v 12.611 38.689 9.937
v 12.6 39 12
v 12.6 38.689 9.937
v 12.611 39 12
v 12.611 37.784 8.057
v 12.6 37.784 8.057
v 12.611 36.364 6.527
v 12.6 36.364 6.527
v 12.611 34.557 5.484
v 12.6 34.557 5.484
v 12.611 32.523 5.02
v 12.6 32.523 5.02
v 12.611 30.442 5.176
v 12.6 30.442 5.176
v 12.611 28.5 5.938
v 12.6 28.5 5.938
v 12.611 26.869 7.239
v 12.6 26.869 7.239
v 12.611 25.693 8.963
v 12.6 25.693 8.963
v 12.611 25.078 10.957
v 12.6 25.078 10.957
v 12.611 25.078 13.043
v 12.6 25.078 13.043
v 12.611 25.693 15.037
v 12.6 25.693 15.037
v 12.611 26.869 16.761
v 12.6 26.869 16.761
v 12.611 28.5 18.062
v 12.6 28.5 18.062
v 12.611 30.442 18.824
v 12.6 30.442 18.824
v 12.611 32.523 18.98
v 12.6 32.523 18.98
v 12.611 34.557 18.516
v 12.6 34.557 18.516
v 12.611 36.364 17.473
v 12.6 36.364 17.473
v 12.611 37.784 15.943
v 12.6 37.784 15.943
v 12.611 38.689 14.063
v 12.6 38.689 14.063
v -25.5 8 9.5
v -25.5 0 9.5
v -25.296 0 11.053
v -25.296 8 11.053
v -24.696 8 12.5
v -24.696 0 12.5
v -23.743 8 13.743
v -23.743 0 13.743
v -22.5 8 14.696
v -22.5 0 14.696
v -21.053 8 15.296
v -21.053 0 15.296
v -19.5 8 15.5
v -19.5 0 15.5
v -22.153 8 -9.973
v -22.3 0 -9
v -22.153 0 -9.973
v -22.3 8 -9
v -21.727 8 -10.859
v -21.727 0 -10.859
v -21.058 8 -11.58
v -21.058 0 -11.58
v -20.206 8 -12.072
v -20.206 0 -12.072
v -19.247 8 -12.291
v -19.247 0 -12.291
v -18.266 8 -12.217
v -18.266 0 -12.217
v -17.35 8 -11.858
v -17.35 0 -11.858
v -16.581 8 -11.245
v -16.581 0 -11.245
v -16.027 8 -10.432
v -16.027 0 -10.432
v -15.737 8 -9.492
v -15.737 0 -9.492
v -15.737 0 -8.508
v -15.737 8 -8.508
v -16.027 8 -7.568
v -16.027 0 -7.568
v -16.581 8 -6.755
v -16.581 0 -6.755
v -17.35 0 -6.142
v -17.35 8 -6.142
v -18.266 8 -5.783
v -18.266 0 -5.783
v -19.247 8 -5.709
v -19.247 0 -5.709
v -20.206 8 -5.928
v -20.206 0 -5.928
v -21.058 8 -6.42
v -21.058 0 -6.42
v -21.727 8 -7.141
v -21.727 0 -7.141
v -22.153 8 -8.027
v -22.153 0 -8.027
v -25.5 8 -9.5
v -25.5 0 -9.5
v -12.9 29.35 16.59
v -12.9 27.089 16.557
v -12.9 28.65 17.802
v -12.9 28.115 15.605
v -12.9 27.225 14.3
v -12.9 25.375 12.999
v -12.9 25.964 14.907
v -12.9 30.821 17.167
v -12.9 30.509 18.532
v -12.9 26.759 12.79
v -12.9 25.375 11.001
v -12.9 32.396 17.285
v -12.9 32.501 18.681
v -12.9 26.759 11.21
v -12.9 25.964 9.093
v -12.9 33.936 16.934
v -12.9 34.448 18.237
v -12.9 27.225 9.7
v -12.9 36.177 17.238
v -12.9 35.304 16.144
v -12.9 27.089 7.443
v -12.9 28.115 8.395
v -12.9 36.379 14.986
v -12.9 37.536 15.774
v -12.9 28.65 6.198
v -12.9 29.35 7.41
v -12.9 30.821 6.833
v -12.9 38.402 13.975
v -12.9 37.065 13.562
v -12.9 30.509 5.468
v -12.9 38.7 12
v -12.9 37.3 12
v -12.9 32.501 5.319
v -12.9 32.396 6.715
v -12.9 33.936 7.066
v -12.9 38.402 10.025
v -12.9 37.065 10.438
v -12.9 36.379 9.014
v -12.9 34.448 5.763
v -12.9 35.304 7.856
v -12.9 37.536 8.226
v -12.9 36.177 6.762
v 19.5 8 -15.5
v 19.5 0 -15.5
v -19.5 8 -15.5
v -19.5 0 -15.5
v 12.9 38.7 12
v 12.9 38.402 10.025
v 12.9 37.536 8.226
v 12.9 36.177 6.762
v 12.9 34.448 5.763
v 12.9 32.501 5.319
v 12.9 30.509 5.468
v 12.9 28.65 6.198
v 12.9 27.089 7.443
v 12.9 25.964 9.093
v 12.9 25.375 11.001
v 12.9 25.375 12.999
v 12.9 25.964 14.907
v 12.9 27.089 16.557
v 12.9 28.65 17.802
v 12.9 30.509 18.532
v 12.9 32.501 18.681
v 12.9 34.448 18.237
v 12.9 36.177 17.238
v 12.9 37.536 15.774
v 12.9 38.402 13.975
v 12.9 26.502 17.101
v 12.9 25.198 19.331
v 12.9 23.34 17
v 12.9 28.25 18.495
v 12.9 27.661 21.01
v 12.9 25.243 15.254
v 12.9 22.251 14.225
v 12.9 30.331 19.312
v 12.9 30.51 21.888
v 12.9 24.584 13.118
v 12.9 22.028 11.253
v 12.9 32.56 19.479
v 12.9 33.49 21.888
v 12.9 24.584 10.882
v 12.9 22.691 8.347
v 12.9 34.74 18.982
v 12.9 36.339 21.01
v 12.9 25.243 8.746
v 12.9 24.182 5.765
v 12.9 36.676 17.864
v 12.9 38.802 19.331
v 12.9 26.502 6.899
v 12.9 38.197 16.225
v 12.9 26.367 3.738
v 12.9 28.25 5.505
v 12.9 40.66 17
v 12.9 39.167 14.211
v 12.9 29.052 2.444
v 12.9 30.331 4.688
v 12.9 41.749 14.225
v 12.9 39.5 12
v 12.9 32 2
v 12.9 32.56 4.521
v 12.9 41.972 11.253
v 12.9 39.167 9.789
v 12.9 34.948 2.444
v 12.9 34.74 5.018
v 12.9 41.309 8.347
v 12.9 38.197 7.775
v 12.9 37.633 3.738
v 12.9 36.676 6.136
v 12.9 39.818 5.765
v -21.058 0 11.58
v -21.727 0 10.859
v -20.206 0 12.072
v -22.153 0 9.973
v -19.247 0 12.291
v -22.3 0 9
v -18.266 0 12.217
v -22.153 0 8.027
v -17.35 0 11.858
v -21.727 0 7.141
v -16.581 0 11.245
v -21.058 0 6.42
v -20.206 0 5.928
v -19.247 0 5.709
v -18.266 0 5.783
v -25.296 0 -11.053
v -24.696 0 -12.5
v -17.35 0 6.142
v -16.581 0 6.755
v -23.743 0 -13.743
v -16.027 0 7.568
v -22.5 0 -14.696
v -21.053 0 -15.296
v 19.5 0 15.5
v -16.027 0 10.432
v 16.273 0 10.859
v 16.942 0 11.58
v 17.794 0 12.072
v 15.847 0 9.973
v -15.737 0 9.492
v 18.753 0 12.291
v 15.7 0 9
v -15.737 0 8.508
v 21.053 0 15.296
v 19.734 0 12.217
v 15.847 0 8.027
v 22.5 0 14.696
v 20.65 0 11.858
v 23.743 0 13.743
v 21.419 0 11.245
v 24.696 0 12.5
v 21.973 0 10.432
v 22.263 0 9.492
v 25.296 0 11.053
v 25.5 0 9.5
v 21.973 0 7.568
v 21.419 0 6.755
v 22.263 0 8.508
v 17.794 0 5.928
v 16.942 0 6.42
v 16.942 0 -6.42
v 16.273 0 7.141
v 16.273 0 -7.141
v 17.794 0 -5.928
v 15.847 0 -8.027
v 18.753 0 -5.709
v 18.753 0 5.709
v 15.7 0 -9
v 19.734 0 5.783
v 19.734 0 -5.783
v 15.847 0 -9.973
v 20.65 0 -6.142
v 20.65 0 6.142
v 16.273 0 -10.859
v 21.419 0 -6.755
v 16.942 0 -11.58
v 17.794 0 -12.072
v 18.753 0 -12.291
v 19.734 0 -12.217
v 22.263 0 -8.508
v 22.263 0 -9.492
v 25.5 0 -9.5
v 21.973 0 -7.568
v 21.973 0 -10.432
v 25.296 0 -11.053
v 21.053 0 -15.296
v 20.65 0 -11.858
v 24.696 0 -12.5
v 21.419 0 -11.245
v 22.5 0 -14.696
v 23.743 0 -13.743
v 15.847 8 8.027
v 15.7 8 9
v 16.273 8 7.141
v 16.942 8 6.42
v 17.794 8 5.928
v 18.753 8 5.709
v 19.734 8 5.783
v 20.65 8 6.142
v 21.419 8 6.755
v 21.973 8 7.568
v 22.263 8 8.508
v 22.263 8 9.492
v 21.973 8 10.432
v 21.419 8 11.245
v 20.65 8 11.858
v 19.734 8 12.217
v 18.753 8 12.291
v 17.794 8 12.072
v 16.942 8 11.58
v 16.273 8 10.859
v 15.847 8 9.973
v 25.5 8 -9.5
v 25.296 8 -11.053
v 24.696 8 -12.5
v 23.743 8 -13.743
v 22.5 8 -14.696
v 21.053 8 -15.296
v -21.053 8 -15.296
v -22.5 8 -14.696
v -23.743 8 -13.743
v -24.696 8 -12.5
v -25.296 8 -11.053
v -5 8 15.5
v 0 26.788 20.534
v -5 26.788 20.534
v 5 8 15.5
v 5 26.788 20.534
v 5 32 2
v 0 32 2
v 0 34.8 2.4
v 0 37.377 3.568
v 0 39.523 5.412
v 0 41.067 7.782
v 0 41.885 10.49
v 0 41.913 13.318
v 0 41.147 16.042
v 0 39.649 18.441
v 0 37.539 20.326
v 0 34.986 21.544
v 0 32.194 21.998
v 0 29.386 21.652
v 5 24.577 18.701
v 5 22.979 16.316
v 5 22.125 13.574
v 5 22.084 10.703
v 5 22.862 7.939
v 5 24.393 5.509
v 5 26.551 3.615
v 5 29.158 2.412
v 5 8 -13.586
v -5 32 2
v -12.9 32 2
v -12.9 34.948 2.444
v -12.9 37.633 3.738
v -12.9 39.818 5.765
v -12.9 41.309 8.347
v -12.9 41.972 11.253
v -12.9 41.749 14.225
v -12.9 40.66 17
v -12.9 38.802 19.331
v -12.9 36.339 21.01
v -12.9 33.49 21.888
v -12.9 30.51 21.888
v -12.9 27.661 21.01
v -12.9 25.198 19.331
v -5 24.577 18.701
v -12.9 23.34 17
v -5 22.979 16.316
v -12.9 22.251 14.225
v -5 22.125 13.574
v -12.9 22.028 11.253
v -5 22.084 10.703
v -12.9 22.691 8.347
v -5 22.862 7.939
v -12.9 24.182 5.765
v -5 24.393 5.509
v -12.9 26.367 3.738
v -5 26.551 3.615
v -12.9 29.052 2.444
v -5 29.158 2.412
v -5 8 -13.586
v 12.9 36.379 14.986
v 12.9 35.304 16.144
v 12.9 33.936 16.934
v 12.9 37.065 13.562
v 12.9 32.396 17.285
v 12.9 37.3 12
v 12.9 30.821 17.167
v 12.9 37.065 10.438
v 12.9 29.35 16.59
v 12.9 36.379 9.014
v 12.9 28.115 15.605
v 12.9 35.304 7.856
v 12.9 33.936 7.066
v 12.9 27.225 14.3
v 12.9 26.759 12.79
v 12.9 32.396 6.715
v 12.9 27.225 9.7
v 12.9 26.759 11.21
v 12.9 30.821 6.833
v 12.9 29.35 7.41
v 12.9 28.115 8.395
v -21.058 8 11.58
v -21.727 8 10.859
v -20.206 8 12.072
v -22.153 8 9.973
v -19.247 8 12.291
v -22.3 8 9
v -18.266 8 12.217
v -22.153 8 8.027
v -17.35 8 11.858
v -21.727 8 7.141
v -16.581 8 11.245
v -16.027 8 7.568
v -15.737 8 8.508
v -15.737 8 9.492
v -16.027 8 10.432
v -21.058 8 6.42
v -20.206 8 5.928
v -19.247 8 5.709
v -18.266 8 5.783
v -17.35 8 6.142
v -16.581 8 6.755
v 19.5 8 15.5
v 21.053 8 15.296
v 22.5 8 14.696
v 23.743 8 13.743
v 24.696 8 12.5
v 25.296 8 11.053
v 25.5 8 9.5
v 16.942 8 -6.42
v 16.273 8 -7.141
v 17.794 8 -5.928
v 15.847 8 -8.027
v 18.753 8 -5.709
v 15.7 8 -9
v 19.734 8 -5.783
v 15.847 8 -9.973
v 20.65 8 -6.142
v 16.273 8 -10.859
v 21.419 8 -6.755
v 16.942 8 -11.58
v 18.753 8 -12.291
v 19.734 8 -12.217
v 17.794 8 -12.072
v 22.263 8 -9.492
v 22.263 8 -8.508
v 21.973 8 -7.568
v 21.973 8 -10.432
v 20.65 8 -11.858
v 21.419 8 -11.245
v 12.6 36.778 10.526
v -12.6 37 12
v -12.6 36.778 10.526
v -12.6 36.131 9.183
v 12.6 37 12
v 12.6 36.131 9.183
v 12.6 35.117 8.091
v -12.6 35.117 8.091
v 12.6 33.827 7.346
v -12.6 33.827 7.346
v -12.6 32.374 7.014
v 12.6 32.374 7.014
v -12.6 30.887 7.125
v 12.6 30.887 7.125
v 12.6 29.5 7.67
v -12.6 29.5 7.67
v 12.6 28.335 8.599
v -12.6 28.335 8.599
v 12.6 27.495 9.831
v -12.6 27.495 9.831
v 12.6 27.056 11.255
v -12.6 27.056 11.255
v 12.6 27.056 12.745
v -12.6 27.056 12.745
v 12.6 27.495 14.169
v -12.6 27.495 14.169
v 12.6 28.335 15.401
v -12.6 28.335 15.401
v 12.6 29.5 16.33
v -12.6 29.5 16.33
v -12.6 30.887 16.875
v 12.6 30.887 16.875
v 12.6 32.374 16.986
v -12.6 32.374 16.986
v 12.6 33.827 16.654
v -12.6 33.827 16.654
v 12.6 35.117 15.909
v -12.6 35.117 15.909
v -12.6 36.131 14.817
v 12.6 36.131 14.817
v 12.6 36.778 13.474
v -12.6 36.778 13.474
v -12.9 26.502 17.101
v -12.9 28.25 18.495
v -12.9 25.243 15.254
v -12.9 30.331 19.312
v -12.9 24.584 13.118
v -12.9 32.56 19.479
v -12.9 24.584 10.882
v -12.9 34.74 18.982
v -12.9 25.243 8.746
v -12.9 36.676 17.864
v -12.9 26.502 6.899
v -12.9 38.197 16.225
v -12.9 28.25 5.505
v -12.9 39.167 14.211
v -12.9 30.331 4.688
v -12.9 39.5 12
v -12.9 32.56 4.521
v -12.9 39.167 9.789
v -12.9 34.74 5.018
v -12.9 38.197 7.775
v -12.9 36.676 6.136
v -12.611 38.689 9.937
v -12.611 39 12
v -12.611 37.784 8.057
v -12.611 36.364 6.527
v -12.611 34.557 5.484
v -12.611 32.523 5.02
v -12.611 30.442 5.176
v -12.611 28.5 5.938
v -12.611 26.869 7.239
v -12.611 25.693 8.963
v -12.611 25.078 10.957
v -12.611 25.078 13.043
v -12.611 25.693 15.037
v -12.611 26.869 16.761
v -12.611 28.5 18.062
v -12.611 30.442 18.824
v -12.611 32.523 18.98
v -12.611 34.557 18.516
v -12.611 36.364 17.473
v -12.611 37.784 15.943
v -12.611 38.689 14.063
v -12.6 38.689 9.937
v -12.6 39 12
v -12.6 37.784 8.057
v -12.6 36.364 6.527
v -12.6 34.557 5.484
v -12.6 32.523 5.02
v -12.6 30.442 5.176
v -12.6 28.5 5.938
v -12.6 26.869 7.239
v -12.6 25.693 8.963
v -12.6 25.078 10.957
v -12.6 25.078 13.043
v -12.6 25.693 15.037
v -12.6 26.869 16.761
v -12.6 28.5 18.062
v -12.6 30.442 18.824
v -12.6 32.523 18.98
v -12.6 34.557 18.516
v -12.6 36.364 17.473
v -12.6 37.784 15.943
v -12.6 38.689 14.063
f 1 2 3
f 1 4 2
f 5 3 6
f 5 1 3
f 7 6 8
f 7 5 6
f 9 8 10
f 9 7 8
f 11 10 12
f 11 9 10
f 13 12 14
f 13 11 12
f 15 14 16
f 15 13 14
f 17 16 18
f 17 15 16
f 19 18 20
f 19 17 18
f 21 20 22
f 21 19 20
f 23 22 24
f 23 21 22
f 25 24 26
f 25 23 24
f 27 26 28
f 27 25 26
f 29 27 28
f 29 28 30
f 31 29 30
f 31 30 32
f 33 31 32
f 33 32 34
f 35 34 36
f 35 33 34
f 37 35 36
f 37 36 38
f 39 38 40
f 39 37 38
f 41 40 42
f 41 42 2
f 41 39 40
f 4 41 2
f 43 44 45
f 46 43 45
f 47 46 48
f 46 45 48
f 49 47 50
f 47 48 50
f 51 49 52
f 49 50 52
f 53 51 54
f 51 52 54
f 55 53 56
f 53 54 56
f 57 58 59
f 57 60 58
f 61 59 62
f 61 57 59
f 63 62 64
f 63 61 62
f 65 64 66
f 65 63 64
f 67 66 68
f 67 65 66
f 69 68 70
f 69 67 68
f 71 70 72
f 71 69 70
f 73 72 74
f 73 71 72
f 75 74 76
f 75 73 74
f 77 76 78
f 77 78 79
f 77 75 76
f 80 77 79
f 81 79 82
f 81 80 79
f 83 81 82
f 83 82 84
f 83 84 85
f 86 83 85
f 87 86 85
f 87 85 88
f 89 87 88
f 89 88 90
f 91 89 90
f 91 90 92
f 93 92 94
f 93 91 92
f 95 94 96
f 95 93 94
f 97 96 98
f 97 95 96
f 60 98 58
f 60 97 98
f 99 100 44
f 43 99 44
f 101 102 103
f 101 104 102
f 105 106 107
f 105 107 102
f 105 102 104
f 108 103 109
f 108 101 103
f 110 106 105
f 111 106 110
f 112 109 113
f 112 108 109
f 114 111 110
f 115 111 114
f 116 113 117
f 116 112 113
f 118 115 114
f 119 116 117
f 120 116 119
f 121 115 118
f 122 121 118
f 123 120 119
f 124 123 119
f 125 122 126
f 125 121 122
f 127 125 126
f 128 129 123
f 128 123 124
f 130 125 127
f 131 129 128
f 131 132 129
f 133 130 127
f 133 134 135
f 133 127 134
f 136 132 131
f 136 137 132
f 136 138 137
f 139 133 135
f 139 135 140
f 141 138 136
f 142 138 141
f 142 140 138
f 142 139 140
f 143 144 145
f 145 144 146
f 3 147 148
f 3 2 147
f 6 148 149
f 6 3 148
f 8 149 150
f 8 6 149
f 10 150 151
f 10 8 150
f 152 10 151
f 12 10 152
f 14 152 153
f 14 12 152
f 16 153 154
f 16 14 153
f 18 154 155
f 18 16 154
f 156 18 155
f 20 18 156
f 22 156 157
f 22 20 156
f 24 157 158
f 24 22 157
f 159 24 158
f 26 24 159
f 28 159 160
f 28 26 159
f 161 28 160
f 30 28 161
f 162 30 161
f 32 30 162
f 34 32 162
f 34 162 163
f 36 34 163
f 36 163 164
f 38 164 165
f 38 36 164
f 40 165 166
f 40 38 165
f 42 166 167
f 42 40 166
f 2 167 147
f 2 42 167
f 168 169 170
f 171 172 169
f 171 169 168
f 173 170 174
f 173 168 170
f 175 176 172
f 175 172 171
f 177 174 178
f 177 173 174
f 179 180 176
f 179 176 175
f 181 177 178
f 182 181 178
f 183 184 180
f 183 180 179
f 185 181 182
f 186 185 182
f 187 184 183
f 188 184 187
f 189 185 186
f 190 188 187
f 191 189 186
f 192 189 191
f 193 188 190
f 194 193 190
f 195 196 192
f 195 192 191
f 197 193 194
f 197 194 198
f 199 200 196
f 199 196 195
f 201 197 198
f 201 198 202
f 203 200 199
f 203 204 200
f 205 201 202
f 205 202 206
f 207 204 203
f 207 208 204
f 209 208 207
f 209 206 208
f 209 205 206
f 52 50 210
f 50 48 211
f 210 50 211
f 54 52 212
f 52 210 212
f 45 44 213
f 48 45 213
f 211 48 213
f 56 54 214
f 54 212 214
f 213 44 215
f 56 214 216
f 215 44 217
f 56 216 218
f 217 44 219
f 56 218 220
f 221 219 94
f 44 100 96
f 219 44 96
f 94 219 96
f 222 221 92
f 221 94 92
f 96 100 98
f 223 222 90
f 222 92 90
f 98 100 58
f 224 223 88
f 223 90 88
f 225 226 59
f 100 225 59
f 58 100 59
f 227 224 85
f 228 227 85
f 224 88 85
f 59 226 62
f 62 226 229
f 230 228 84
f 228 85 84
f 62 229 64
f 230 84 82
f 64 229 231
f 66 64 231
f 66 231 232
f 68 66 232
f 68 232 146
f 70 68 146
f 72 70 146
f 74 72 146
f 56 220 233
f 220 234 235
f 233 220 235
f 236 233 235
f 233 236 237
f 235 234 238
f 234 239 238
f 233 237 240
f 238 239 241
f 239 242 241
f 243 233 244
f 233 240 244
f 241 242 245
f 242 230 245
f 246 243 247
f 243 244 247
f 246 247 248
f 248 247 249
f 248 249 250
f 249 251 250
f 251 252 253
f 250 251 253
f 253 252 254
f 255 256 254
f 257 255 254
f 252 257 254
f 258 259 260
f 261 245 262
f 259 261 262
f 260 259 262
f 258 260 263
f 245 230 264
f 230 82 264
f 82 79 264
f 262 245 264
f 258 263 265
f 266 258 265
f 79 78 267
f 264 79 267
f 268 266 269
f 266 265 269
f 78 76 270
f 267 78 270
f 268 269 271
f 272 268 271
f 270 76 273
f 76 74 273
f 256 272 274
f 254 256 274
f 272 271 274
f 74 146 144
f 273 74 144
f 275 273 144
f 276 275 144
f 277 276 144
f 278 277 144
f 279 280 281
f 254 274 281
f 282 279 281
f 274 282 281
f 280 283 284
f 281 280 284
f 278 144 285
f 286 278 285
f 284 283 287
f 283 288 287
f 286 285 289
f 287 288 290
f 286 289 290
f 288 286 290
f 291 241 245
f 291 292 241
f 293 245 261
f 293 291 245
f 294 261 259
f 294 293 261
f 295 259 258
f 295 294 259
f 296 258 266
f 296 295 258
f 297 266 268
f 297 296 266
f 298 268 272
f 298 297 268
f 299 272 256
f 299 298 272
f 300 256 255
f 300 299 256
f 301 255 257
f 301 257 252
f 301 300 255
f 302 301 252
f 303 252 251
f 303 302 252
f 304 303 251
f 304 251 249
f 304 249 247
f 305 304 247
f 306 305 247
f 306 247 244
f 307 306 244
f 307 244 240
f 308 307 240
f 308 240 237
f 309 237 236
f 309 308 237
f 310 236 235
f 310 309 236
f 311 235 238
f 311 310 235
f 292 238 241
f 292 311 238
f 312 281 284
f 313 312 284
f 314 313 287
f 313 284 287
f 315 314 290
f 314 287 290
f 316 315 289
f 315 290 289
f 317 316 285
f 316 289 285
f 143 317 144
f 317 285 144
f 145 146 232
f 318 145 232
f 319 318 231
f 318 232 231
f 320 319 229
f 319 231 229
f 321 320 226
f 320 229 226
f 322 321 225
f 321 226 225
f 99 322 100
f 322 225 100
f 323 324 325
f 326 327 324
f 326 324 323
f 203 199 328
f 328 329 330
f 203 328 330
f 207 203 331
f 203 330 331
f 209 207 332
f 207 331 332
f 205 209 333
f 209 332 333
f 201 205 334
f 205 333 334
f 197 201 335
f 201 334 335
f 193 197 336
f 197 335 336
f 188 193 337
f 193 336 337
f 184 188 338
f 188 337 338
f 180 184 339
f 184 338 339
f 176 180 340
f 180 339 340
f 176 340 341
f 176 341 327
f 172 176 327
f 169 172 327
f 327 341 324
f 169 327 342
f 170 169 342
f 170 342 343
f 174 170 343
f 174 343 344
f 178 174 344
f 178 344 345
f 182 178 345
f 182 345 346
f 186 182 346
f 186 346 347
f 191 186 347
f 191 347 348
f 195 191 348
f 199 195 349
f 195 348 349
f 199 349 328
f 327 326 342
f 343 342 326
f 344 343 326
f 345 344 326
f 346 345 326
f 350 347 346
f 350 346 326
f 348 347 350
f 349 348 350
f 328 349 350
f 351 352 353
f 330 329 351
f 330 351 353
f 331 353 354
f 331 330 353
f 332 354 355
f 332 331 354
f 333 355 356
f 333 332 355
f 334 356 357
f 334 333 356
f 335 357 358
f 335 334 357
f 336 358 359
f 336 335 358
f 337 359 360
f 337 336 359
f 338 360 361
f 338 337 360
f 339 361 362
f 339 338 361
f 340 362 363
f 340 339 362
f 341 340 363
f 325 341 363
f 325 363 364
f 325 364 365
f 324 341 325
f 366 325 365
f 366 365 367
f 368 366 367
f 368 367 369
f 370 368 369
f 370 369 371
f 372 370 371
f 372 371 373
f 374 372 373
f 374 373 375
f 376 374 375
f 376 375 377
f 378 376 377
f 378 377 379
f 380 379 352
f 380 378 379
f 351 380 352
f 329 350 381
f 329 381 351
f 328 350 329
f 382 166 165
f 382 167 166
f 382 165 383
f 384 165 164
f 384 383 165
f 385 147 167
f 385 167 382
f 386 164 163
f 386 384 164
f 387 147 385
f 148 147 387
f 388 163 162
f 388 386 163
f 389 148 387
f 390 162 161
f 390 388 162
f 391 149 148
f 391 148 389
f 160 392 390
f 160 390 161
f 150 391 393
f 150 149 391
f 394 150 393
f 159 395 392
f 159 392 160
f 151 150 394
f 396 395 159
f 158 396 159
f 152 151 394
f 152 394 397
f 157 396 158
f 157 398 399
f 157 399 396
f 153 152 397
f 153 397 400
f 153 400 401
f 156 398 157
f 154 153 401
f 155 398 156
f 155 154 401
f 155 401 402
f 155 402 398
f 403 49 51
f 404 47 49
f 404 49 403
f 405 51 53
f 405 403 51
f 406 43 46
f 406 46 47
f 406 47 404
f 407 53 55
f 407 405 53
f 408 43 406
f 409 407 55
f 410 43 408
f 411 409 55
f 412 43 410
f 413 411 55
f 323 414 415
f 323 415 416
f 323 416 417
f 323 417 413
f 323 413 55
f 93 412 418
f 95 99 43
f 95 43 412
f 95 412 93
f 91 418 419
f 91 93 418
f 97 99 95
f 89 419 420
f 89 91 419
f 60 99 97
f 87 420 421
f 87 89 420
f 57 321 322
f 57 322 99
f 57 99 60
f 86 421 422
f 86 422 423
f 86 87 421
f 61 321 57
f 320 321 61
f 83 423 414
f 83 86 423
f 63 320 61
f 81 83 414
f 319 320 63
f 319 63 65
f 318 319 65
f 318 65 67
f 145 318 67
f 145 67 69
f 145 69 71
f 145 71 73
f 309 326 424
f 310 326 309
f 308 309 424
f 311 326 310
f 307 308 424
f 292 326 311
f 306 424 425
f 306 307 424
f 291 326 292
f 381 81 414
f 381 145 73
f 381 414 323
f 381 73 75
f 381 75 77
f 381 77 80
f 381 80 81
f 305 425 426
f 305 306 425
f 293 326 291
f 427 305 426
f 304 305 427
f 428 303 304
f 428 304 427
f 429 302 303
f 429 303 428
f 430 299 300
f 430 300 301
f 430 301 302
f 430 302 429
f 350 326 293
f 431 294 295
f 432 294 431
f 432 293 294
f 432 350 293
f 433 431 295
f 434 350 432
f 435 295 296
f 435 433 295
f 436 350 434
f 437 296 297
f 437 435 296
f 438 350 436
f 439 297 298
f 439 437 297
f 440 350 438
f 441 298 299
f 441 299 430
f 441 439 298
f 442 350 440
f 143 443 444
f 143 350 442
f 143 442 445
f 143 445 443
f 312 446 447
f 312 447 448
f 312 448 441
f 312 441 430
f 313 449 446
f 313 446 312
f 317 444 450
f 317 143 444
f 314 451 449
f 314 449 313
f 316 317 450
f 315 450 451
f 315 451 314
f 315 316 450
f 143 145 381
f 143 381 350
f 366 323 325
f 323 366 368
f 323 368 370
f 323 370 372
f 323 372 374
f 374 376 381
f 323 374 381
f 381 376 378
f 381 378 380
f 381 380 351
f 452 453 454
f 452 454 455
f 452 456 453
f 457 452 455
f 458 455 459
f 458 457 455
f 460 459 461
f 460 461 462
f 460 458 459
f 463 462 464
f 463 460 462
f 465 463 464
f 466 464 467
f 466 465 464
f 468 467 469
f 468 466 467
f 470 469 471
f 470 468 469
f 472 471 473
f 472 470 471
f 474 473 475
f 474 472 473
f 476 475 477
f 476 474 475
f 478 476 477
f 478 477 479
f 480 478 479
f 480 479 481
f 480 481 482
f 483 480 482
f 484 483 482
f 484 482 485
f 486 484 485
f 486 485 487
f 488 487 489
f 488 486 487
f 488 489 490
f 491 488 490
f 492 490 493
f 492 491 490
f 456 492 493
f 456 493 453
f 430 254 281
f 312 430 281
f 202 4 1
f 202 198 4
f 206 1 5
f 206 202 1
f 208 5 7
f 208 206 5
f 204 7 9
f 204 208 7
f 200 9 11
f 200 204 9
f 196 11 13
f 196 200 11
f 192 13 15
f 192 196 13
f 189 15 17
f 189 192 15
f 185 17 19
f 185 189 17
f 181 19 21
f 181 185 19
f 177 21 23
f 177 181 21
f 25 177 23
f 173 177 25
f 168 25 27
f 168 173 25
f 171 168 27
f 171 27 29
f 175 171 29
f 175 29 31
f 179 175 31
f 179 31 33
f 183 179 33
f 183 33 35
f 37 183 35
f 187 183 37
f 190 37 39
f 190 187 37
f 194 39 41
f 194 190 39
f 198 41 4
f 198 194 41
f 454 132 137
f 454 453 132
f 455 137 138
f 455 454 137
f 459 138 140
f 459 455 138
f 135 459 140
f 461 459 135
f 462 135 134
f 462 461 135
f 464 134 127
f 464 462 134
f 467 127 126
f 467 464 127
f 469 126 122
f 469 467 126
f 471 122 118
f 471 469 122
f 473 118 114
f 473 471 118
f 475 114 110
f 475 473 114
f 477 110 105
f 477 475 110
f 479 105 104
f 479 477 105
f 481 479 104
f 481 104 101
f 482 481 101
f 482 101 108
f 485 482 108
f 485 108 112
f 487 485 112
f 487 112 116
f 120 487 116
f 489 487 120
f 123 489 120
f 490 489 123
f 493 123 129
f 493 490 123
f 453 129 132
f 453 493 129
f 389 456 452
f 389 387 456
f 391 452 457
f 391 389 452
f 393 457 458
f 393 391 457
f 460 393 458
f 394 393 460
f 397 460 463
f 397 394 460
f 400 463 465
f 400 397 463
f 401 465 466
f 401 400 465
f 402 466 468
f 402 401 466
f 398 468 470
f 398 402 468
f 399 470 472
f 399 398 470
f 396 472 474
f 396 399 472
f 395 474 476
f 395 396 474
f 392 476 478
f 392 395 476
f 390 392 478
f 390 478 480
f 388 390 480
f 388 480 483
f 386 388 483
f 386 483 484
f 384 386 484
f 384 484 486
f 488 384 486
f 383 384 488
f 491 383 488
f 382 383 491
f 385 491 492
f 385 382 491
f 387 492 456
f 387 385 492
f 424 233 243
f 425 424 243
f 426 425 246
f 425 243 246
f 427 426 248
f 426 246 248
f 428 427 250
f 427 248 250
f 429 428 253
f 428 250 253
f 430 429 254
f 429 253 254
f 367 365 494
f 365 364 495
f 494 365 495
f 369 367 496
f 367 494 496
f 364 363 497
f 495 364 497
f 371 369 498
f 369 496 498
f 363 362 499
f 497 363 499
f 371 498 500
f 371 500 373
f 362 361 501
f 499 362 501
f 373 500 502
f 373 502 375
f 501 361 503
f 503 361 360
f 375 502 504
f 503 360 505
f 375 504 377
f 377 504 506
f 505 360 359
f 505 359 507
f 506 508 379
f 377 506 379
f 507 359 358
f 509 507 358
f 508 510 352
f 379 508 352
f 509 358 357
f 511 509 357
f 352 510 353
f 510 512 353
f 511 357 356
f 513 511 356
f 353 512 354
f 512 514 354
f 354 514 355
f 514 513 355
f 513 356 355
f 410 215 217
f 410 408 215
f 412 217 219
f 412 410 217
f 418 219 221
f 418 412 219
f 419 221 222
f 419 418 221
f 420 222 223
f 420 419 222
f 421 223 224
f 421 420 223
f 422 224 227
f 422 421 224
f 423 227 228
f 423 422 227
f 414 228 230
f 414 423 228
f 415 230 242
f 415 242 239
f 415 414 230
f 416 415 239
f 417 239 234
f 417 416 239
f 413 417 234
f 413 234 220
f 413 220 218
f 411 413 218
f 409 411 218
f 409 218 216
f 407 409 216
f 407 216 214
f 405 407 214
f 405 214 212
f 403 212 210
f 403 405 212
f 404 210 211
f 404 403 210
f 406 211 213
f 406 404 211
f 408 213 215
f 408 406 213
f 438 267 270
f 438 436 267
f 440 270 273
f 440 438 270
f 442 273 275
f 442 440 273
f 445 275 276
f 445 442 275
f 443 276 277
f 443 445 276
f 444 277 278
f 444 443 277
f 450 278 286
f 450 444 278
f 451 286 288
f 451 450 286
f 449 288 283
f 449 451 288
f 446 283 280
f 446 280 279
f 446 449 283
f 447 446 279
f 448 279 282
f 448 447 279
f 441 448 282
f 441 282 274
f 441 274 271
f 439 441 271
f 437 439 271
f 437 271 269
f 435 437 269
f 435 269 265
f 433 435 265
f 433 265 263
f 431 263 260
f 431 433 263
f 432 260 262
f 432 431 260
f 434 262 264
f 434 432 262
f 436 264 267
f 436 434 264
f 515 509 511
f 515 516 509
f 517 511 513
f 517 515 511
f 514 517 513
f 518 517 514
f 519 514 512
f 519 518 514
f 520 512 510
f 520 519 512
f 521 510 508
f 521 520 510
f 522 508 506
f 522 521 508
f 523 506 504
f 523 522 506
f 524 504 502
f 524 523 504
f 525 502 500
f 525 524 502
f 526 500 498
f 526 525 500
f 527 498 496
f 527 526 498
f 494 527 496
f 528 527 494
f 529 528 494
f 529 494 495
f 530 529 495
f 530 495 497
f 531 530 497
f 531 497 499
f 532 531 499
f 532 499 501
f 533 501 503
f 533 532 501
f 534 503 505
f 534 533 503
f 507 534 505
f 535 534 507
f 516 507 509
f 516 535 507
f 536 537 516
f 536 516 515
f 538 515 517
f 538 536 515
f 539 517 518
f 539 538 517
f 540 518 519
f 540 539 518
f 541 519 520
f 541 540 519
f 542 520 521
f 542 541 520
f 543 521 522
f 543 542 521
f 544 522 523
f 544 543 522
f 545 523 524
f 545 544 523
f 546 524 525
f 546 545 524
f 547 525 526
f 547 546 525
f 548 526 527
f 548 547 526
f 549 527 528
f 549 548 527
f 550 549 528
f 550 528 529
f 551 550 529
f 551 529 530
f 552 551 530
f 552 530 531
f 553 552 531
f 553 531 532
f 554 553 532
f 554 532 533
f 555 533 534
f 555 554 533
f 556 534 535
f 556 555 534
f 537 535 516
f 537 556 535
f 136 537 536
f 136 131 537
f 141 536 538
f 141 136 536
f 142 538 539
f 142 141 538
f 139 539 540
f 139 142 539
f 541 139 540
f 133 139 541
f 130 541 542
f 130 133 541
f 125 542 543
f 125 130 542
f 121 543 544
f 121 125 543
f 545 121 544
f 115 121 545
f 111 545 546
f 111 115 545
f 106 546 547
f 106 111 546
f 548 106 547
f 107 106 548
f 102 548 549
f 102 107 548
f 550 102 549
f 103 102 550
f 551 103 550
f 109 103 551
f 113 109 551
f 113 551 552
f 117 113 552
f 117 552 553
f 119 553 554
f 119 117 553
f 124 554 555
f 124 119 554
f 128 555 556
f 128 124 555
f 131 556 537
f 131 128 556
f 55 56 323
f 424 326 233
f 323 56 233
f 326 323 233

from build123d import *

# Parameters (mm, degrees)
BOSS_EXTRUDE1_DEPTH      = 8
BOSS_EXTRUDE2_DEPTH      = 5
BOSS_EXTRUDE2_DEPTH_BACK = 5
SKETCH3_R                = 10
BOSS_EXTRUDE3_DEPTH      = 12.9
BOSS_EXTRUDE3_DEPTH_BACK = 12.9
SKETCH4_W                = 3.3
SKETCH4_H                = 8
SKETCH5_W                = 3.3
SKETCH5_H                = 8
SKETCH6_W                = 3.3
SKETCH6_H                = 8
SKETCH7_W                = 3.3
SKETCH7_H                = 8


with BuildPart() as part:
    # Sketch1 → Boss-Extrude1 (new body)
    with BuildSketch(Plane(origin=(0, 0, 0), x_dir=(1, 0, 0), z_dir=(0, 1, 0))):
        with BuildLine():
            Line((-19.5, -15.5), (19.5, -15.5))
            ThreePointArc((19.5, -15.5), (23.742640687, -13.742640687), (25.5, -9.5))
            Line((25.5, -9.5), (25.5, 9.5))
            ThreePointArc((25.5, 9.5), (23.742640687, 13.742640687), (19.5, 15.5))
            Line((19.5, 15.5), (-19.5, 15.5))
            ThreePointArc((-19.5, 15.5), (-23.742640687, 13.742640687), (-25.5, 9.5))
            Line((-25.5, 9.5), (-25.5, -9.5))
            ThreePointArc((-25.5, -9.5), (-23.742640687, -13.742640687), (-19.5, -15.5))
        make_face()
    extrude(amount=BOSS_EXTRUDE1_DEPTH)

    # Sketch2 → Boss-Extrude2 (add, two sides)
    with BuildSketch(Plane(origin=(0, 0, 0), x_dir=(0, 0, -1), z_dir=(1, 0, 0))) as boss_extrude2_sk:
        Polygon((-21.265544457, 29.517304845), (-15.5, 8), (13.585782237, 8), (-3.482172222, 34.282345074), align=None)
    extrude(amount=BOSS_EXTRUDE2_DEPTH)
    extrude(boss_extrude2_sk.sketch, amount=-BOSS_EXTRUDE2_DEPTH_BACK)

    # Sketch3 → Boss-Extrude3 (add, two sides)
    with BuildSketch(Plane(origin=(0, 0, 0), x_dir=(0, 0, -1), z_dir=(1, 0, 0))) as boss_extrude3_sk:
        with Locations((-12, 32)):
            Circle(SKETCH3_R)
    extrude(amount=BOSS_EXTRUDE3_DEPTH)
    extrude(boss_extrude3_sk.sketch, amount=-BOSS_EXTRUDE3_DEPTH_BACK)

    # Sketch4 → Cut-Revolve1 (revolve, cut)
    with BuildSketch(Plane.XY.offset(9)):
        with Locations((-20.65, 4)):
            Rectangle(SKETCH4_W, SKETCH4_H)
    revolve(axis=Axis((-19, 8, 9), (0, -1, 0)), mode=Mode.SUBTRACT)

    # Sketch5 → Cut-Revolve2 (revolve, cut)
    with BuildSketch(Plane.XY.offset(9)):
        with Locations((17.35, 4)):
            Rectangle(SKETCH5_W, SKETCH5_H)
    revolve(axis=Axis((19, 8, 9), (0, -1, 0)), mode=Mode.SUBTRACT)

    # Sketch6 → Cut-Revolve3 (revolve, cut)
    with BuildSketch(Plane.XY.offset(-9)):
        with Locations((-20.65, 4)):
            Rectangle(SKETCH6_W, SKETCH6_H)
    revolve(axis=Axis((-19, 8, -9), (0, -1, 0)), mode=Mode.SUBTRACT)

    # Sketch7 → Cut-Revolve4 (revolve, cut)
    with BuildSketch(Plane.XY.offset(-9)):
        with Locations((17.35, 4)):
            Rectangle(SKETCH7_W, SKETCH7_H)
    revolve(axis=Axis((19, 8, -9), (0, -1, 0)), mode=Mode.SUBTRACT)

    # Sketch8 → Cut-Revolve5 (revolve, cut)
    with BuildSketch(Plane.XY.offset(12)):
        Polygon((-12.9, 32), (-12.9, 39.5), (-12.611324865, 39), (12.611324865, 39), (12.9, 39.5), (12.9, 32), align=None)
    revolve(axis=Axis((12.9, 32, 12), (-1, 0, 0)), mode=Mode.SUBTRACT)

    # Sketch9 → Revolve1 (revolve)
    with BuildSketch(Plane.XY.offset(12)):
        Polygon((-12.9, 37.3), (-12.6, 37), (12.6, 37), (12.9, 37.3), (12.9, 38.7), (12.6, 39), (-12.6, 39), (-12.9, 38.7), align=None)
    revolve(axis=Axis((12.9, 32, 12), (-1, 0, 0)))


solid = part.part
